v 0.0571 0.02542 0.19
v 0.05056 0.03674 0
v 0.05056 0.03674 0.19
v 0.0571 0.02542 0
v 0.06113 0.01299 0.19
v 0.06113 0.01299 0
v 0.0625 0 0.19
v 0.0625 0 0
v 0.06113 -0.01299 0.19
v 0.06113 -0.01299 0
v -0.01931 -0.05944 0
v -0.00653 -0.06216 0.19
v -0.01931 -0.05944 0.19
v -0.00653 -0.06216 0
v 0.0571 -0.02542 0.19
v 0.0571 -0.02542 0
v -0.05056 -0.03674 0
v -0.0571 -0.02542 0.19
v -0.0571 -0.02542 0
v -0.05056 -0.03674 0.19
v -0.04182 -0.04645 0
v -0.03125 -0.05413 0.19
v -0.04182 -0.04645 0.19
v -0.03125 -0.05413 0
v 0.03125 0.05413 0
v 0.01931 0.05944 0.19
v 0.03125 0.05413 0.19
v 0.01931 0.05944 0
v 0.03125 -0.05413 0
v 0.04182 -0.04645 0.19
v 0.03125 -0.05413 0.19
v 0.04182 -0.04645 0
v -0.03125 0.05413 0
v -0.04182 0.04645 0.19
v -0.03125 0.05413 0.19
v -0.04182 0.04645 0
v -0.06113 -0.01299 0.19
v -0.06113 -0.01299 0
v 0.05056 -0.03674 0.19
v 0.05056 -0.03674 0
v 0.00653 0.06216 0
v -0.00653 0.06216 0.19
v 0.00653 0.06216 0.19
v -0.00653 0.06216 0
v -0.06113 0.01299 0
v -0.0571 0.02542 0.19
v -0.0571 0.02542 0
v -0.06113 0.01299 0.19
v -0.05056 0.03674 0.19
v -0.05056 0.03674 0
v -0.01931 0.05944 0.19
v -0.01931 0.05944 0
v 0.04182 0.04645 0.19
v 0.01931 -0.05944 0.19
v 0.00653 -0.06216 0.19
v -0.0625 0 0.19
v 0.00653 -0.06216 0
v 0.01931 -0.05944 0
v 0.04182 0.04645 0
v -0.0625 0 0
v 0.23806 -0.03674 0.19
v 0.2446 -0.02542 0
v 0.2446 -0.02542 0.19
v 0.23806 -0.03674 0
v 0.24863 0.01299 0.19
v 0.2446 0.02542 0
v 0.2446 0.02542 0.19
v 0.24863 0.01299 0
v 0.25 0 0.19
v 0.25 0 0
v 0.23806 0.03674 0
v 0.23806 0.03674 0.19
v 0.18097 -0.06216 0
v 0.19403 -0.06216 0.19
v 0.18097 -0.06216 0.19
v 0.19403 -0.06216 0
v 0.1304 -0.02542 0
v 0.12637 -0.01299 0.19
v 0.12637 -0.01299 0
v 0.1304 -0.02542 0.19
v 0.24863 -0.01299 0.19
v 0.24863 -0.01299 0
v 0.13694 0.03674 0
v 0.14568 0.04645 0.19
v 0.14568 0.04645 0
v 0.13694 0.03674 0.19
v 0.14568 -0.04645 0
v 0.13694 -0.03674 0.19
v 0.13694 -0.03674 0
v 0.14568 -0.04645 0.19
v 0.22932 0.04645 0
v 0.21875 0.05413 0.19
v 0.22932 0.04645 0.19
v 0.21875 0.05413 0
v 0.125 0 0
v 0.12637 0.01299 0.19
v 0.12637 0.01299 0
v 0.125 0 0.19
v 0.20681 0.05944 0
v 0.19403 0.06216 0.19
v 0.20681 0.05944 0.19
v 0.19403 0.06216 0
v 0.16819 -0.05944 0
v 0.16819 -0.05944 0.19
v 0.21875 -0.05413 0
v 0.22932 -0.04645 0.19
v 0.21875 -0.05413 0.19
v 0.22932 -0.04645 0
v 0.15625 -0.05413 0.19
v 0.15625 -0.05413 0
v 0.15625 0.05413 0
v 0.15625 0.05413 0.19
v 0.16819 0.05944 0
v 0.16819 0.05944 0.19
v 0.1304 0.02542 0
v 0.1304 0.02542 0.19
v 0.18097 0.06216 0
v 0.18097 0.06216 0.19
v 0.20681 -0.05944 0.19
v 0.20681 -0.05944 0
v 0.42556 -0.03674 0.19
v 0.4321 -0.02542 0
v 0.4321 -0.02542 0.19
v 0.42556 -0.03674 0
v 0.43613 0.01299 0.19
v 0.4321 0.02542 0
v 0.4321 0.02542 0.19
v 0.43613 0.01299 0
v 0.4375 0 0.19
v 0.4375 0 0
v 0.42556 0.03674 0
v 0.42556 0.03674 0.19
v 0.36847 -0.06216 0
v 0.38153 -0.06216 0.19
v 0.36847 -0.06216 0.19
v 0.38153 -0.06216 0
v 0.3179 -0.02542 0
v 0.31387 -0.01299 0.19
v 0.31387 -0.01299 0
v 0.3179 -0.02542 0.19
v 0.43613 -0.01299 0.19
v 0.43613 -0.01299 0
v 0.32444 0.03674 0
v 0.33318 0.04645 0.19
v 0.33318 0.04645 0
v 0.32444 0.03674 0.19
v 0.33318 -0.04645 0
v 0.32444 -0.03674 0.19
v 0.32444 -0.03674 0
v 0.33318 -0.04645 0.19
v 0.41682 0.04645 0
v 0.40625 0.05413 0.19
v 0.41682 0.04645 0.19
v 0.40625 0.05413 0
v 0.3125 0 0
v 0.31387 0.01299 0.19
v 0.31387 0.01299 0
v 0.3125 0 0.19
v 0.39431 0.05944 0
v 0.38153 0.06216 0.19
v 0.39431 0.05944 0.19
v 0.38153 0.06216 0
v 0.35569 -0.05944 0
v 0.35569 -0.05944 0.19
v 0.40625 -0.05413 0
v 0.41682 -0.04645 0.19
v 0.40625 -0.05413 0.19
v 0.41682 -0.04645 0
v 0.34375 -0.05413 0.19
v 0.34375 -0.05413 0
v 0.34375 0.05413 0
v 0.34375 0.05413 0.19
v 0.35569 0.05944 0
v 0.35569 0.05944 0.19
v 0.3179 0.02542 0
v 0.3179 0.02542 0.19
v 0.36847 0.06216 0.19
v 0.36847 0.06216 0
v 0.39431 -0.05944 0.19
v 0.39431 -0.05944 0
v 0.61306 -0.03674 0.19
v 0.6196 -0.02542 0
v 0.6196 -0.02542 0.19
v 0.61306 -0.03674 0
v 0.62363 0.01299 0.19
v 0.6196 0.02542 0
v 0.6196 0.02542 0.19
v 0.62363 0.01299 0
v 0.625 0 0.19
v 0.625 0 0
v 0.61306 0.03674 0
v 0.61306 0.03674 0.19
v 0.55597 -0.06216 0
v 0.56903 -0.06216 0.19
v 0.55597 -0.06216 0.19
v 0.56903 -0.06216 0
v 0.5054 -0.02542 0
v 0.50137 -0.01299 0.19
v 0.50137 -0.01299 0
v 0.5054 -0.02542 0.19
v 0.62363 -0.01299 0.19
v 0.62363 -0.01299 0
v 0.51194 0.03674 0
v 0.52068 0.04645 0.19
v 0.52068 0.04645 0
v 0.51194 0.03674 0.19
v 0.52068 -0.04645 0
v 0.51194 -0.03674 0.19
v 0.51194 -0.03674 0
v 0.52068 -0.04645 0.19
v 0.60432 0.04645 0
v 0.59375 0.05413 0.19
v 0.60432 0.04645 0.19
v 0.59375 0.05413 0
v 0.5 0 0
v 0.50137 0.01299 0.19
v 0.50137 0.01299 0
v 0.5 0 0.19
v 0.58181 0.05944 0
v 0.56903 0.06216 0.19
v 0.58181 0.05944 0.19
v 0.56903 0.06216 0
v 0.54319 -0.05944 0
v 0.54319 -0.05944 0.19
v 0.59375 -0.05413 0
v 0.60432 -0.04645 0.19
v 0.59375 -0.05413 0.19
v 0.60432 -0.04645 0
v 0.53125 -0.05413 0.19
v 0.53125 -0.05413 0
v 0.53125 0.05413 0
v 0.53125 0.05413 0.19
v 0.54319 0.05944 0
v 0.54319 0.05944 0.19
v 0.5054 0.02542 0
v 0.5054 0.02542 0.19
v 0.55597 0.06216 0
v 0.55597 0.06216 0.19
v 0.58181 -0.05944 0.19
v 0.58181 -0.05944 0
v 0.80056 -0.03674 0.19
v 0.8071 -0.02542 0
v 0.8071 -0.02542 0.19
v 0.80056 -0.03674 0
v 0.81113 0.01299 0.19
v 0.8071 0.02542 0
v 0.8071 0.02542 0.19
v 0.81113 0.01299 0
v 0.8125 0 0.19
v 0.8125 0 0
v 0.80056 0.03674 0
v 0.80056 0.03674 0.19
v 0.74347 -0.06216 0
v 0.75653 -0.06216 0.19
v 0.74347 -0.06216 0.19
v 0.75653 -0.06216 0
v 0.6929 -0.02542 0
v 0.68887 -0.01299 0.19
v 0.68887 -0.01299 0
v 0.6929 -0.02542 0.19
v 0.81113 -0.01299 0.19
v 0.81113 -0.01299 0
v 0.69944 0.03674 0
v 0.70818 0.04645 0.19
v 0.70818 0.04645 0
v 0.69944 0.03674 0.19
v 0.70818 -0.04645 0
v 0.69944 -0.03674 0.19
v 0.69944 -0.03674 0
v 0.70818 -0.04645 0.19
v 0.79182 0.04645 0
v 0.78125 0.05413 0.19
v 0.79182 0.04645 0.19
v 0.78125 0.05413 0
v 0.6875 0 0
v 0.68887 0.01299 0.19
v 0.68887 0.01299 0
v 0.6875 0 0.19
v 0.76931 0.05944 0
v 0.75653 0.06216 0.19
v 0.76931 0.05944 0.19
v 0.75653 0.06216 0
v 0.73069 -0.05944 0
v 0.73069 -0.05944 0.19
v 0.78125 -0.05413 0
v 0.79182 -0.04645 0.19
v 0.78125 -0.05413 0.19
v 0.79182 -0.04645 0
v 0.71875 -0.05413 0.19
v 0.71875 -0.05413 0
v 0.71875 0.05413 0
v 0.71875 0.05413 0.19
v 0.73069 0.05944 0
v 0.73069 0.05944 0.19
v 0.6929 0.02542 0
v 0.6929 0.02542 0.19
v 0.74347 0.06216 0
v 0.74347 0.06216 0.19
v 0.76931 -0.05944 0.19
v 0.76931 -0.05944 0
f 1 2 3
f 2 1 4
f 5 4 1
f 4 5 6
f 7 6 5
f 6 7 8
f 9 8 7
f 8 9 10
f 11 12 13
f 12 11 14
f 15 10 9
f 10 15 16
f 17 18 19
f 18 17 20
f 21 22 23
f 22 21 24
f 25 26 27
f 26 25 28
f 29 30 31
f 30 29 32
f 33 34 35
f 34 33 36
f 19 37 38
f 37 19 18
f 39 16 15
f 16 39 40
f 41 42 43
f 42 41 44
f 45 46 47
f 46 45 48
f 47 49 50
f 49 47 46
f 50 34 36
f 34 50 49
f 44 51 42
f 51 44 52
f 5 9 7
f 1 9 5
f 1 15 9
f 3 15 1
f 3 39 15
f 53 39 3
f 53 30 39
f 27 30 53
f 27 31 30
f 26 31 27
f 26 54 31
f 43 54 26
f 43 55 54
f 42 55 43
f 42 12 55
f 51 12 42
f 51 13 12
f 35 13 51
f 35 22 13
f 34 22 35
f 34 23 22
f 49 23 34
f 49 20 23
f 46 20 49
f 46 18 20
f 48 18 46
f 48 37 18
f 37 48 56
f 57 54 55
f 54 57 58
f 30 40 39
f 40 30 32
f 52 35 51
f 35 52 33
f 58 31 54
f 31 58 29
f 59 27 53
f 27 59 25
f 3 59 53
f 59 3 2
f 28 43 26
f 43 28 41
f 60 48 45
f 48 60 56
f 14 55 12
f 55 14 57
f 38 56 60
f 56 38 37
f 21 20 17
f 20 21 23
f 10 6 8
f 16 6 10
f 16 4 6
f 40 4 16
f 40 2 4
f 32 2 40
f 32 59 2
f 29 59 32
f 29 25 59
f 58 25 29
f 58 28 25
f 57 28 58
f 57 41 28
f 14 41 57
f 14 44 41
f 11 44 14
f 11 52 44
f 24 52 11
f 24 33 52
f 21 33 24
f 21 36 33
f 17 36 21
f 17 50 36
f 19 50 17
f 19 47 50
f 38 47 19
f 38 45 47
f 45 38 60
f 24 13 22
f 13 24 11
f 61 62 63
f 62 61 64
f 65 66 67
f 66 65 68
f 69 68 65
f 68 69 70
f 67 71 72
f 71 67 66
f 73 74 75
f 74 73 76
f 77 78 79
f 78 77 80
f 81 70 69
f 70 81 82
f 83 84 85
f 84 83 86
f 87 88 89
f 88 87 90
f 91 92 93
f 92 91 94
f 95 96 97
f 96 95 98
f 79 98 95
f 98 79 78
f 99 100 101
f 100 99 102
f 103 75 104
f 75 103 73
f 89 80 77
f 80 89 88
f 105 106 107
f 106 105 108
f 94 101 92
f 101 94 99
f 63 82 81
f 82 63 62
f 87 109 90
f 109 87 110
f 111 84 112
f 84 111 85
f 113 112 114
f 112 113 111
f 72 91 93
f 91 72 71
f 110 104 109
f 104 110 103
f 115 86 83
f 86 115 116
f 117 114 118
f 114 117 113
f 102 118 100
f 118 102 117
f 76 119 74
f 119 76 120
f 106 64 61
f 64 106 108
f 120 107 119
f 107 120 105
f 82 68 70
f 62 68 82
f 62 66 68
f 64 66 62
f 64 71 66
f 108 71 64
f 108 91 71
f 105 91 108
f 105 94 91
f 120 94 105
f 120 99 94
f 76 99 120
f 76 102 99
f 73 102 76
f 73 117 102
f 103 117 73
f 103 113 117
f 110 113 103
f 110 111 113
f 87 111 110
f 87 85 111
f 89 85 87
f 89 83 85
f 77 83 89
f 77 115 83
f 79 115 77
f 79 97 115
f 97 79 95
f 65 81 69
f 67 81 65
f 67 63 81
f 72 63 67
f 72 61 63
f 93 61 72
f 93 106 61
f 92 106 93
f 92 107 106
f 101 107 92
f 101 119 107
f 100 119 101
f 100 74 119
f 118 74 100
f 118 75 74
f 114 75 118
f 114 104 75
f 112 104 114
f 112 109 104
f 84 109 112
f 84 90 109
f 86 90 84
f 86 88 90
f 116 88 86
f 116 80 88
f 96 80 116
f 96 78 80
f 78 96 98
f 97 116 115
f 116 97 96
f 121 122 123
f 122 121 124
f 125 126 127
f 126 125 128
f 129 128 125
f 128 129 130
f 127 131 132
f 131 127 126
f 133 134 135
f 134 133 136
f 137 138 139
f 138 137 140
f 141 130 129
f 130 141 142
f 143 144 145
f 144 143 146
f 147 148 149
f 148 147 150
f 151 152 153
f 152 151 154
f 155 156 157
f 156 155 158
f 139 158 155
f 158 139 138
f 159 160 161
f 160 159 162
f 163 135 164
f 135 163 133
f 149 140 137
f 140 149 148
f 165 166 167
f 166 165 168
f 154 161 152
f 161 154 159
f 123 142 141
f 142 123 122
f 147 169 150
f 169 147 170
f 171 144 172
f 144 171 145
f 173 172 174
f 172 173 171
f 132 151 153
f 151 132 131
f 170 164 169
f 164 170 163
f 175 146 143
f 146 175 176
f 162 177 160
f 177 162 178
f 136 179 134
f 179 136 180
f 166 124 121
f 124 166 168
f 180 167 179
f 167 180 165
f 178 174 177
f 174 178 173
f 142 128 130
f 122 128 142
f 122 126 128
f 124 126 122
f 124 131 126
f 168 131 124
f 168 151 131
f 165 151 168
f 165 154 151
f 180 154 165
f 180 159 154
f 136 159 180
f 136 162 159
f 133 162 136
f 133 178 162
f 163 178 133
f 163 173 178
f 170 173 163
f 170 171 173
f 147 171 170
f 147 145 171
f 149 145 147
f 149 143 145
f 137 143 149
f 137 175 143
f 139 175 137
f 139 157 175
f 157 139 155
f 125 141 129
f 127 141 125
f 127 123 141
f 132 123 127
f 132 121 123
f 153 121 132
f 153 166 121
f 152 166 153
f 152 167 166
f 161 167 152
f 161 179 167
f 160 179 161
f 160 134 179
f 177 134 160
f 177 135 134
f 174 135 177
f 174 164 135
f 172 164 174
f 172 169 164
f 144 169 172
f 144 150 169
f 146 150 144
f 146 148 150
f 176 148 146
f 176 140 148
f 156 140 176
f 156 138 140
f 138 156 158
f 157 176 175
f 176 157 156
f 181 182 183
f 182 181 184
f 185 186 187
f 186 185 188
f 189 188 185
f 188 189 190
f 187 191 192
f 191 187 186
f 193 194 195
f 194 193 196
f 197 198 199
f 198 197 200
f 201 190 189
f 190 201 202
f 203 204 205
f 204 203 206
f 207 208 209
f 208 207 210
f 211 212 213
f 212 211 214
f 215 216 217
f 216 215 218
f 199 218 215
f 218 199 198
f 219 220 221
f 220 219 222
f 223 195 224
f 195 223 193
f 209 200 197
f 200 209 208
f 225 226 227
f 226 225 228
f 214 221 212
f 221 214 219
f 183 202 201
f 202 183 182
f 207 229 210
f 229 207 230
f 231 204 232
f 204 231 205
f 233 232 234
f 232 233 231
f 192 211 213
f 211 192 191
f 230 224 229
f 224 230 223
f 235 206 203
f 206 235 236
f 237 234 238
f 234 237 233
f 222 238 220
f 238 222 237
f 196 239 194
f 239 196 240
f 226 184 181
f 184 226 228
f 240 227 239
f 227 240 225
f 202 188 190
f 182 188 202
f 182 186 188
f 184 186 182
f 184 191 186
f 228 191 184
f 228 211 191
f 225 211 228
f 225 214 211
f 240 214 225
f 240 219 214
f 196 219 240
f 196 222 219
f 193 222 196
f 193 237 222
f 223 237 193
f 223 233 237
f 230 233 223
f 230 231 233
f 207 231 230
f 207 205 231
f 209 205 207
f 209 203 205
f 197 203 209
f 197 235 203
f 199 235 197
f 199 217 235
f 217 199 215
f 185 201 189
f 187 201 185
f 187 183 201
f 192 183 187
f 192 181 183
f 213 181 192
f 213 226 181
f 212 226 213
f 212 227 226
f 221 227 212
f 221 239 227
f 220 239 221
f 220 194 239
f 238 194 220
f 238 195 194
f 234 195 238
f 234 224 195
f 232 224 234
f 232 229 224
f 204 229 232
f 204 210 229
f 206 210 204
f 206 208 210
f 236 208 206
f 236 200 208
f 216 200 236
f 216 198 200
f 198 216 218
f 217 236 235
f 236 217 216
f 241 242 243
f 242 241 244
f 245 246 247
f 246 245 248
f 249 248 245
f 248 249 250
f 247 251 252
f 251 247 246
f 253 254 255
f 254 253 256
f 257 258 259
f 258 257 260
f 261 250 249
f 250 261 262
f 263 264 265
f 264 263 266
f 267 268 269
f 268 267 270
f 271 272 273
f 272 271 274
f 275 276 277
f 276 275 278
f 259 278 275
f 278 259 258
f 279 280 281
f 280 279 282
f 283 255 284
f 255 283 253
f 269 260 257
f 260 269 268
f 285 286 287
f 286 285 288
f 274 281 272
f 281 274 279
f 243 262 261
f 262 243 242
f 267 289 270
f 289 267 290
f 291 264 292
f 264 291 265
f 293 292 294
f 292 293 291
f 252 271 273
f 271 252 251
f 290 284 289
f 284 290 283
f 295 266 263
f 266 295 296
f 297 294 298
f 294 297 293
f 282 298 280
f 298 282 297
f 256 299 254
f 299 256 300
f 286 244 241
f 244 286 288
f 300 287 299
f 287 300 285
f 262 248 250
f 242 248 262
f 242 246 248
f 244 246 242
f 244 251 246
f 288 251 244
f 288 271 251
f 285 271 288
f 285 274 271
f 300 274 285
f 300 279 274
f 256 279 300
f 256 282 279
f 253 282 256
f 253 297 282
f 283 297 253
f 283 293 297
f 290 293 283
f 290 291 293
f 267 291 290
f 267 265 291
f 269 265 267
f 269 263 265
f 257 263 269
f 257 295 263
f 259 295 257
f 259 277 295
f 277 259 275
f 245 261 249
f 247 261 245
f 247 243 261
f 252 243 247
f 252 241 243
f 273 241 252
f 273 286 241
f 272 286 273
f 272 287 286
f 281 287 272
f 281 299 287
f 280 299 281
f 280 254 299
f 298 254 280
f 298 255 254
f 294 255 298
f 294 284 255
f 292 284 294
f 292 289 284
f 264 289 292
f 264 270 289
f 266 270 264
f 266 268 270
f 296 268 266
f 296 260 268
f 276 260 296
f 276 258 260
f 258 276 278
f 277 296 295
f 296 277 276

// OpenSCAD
// file: definitions.scad
TOL = 0.001;

//$fa = 1;
$fs = 0.01;

PCB_WIDTH_ADJ = 0.01;
PCB_HEIGHT_ADJ = 0.05; // solder pins

SCREEN_WIDTH_ADJ = 0.01;

// CALCULATOR DEFINITIONS
PCB_DIM = [2 + PCB_WIDTH_ADJ, 3.75, 0.06 + PCB_HEIGHT_ADJ];
SCREEN_DIM = [1.81 + SCREEN_WIDTH_ADJ, 0.325, 0.175];

SCREEN_OFFSET = 0.14; // from top

HOLE_DIAM = 0.135;
HOLE_POS = [0.082, 0.086];
HOLE_RAD = HOLE_DIAM / 2;

BATT_DIAM = 0.787;
BATT_HEIGHT = 0.2;
BATT_POS = [0.12, 1.5];
BATT_RAD = BATT_DIAM / 2;

BATT_CUTOUT_ADJ = 0.1;

// CASE DEFINITIONS
CASE_THICKNESS = 0.08;
CASE_WIDTH = PCB_DIM.x + 2 * CASE_THICKNESS;

CASE_BASE_HEIGHT = PCB_DIM.z + 2 * CASE_THICKNESS;
CASE_BASE_LENGTH = 2;

CASE_MID_LENGTH = 1;

CASE_EXTRA = 0.1;
FULL_CASE_LENGTH = PCB_DIM.y + 2 * CASE_THICKNESS + CASE_EXTRA;

//echo(FULL_CASE_LENGTH, CASE_WIDTH);

CASE_TOP_HEIGHT = CASE_THICKNESS + PCB_DIM.z + SCREEN_DIM.z - TOL;
CASE_TOP_LENGTH = FULL_CASE_LENGTH - CASE_BASE_LENGTH - CASE_MID_LENGTH;

CASE_ROUND = 0.25;



PLUG_ADJ = 0.005;
plug_rad = HOLE_RAD - PLUG_ADJ;

NUM_PLUGS = 5;
// main file
include <definitions.scad>;

for (p = [0:NUM_PLUGS-1]) {
    translate([(3 * p) * plug_rad, 0, 0])
//    scale([1, 1.05, 1])
    cylinder(r=plug_rad, h=PCB_DIM.z + CASE_THICKNESS);
}
